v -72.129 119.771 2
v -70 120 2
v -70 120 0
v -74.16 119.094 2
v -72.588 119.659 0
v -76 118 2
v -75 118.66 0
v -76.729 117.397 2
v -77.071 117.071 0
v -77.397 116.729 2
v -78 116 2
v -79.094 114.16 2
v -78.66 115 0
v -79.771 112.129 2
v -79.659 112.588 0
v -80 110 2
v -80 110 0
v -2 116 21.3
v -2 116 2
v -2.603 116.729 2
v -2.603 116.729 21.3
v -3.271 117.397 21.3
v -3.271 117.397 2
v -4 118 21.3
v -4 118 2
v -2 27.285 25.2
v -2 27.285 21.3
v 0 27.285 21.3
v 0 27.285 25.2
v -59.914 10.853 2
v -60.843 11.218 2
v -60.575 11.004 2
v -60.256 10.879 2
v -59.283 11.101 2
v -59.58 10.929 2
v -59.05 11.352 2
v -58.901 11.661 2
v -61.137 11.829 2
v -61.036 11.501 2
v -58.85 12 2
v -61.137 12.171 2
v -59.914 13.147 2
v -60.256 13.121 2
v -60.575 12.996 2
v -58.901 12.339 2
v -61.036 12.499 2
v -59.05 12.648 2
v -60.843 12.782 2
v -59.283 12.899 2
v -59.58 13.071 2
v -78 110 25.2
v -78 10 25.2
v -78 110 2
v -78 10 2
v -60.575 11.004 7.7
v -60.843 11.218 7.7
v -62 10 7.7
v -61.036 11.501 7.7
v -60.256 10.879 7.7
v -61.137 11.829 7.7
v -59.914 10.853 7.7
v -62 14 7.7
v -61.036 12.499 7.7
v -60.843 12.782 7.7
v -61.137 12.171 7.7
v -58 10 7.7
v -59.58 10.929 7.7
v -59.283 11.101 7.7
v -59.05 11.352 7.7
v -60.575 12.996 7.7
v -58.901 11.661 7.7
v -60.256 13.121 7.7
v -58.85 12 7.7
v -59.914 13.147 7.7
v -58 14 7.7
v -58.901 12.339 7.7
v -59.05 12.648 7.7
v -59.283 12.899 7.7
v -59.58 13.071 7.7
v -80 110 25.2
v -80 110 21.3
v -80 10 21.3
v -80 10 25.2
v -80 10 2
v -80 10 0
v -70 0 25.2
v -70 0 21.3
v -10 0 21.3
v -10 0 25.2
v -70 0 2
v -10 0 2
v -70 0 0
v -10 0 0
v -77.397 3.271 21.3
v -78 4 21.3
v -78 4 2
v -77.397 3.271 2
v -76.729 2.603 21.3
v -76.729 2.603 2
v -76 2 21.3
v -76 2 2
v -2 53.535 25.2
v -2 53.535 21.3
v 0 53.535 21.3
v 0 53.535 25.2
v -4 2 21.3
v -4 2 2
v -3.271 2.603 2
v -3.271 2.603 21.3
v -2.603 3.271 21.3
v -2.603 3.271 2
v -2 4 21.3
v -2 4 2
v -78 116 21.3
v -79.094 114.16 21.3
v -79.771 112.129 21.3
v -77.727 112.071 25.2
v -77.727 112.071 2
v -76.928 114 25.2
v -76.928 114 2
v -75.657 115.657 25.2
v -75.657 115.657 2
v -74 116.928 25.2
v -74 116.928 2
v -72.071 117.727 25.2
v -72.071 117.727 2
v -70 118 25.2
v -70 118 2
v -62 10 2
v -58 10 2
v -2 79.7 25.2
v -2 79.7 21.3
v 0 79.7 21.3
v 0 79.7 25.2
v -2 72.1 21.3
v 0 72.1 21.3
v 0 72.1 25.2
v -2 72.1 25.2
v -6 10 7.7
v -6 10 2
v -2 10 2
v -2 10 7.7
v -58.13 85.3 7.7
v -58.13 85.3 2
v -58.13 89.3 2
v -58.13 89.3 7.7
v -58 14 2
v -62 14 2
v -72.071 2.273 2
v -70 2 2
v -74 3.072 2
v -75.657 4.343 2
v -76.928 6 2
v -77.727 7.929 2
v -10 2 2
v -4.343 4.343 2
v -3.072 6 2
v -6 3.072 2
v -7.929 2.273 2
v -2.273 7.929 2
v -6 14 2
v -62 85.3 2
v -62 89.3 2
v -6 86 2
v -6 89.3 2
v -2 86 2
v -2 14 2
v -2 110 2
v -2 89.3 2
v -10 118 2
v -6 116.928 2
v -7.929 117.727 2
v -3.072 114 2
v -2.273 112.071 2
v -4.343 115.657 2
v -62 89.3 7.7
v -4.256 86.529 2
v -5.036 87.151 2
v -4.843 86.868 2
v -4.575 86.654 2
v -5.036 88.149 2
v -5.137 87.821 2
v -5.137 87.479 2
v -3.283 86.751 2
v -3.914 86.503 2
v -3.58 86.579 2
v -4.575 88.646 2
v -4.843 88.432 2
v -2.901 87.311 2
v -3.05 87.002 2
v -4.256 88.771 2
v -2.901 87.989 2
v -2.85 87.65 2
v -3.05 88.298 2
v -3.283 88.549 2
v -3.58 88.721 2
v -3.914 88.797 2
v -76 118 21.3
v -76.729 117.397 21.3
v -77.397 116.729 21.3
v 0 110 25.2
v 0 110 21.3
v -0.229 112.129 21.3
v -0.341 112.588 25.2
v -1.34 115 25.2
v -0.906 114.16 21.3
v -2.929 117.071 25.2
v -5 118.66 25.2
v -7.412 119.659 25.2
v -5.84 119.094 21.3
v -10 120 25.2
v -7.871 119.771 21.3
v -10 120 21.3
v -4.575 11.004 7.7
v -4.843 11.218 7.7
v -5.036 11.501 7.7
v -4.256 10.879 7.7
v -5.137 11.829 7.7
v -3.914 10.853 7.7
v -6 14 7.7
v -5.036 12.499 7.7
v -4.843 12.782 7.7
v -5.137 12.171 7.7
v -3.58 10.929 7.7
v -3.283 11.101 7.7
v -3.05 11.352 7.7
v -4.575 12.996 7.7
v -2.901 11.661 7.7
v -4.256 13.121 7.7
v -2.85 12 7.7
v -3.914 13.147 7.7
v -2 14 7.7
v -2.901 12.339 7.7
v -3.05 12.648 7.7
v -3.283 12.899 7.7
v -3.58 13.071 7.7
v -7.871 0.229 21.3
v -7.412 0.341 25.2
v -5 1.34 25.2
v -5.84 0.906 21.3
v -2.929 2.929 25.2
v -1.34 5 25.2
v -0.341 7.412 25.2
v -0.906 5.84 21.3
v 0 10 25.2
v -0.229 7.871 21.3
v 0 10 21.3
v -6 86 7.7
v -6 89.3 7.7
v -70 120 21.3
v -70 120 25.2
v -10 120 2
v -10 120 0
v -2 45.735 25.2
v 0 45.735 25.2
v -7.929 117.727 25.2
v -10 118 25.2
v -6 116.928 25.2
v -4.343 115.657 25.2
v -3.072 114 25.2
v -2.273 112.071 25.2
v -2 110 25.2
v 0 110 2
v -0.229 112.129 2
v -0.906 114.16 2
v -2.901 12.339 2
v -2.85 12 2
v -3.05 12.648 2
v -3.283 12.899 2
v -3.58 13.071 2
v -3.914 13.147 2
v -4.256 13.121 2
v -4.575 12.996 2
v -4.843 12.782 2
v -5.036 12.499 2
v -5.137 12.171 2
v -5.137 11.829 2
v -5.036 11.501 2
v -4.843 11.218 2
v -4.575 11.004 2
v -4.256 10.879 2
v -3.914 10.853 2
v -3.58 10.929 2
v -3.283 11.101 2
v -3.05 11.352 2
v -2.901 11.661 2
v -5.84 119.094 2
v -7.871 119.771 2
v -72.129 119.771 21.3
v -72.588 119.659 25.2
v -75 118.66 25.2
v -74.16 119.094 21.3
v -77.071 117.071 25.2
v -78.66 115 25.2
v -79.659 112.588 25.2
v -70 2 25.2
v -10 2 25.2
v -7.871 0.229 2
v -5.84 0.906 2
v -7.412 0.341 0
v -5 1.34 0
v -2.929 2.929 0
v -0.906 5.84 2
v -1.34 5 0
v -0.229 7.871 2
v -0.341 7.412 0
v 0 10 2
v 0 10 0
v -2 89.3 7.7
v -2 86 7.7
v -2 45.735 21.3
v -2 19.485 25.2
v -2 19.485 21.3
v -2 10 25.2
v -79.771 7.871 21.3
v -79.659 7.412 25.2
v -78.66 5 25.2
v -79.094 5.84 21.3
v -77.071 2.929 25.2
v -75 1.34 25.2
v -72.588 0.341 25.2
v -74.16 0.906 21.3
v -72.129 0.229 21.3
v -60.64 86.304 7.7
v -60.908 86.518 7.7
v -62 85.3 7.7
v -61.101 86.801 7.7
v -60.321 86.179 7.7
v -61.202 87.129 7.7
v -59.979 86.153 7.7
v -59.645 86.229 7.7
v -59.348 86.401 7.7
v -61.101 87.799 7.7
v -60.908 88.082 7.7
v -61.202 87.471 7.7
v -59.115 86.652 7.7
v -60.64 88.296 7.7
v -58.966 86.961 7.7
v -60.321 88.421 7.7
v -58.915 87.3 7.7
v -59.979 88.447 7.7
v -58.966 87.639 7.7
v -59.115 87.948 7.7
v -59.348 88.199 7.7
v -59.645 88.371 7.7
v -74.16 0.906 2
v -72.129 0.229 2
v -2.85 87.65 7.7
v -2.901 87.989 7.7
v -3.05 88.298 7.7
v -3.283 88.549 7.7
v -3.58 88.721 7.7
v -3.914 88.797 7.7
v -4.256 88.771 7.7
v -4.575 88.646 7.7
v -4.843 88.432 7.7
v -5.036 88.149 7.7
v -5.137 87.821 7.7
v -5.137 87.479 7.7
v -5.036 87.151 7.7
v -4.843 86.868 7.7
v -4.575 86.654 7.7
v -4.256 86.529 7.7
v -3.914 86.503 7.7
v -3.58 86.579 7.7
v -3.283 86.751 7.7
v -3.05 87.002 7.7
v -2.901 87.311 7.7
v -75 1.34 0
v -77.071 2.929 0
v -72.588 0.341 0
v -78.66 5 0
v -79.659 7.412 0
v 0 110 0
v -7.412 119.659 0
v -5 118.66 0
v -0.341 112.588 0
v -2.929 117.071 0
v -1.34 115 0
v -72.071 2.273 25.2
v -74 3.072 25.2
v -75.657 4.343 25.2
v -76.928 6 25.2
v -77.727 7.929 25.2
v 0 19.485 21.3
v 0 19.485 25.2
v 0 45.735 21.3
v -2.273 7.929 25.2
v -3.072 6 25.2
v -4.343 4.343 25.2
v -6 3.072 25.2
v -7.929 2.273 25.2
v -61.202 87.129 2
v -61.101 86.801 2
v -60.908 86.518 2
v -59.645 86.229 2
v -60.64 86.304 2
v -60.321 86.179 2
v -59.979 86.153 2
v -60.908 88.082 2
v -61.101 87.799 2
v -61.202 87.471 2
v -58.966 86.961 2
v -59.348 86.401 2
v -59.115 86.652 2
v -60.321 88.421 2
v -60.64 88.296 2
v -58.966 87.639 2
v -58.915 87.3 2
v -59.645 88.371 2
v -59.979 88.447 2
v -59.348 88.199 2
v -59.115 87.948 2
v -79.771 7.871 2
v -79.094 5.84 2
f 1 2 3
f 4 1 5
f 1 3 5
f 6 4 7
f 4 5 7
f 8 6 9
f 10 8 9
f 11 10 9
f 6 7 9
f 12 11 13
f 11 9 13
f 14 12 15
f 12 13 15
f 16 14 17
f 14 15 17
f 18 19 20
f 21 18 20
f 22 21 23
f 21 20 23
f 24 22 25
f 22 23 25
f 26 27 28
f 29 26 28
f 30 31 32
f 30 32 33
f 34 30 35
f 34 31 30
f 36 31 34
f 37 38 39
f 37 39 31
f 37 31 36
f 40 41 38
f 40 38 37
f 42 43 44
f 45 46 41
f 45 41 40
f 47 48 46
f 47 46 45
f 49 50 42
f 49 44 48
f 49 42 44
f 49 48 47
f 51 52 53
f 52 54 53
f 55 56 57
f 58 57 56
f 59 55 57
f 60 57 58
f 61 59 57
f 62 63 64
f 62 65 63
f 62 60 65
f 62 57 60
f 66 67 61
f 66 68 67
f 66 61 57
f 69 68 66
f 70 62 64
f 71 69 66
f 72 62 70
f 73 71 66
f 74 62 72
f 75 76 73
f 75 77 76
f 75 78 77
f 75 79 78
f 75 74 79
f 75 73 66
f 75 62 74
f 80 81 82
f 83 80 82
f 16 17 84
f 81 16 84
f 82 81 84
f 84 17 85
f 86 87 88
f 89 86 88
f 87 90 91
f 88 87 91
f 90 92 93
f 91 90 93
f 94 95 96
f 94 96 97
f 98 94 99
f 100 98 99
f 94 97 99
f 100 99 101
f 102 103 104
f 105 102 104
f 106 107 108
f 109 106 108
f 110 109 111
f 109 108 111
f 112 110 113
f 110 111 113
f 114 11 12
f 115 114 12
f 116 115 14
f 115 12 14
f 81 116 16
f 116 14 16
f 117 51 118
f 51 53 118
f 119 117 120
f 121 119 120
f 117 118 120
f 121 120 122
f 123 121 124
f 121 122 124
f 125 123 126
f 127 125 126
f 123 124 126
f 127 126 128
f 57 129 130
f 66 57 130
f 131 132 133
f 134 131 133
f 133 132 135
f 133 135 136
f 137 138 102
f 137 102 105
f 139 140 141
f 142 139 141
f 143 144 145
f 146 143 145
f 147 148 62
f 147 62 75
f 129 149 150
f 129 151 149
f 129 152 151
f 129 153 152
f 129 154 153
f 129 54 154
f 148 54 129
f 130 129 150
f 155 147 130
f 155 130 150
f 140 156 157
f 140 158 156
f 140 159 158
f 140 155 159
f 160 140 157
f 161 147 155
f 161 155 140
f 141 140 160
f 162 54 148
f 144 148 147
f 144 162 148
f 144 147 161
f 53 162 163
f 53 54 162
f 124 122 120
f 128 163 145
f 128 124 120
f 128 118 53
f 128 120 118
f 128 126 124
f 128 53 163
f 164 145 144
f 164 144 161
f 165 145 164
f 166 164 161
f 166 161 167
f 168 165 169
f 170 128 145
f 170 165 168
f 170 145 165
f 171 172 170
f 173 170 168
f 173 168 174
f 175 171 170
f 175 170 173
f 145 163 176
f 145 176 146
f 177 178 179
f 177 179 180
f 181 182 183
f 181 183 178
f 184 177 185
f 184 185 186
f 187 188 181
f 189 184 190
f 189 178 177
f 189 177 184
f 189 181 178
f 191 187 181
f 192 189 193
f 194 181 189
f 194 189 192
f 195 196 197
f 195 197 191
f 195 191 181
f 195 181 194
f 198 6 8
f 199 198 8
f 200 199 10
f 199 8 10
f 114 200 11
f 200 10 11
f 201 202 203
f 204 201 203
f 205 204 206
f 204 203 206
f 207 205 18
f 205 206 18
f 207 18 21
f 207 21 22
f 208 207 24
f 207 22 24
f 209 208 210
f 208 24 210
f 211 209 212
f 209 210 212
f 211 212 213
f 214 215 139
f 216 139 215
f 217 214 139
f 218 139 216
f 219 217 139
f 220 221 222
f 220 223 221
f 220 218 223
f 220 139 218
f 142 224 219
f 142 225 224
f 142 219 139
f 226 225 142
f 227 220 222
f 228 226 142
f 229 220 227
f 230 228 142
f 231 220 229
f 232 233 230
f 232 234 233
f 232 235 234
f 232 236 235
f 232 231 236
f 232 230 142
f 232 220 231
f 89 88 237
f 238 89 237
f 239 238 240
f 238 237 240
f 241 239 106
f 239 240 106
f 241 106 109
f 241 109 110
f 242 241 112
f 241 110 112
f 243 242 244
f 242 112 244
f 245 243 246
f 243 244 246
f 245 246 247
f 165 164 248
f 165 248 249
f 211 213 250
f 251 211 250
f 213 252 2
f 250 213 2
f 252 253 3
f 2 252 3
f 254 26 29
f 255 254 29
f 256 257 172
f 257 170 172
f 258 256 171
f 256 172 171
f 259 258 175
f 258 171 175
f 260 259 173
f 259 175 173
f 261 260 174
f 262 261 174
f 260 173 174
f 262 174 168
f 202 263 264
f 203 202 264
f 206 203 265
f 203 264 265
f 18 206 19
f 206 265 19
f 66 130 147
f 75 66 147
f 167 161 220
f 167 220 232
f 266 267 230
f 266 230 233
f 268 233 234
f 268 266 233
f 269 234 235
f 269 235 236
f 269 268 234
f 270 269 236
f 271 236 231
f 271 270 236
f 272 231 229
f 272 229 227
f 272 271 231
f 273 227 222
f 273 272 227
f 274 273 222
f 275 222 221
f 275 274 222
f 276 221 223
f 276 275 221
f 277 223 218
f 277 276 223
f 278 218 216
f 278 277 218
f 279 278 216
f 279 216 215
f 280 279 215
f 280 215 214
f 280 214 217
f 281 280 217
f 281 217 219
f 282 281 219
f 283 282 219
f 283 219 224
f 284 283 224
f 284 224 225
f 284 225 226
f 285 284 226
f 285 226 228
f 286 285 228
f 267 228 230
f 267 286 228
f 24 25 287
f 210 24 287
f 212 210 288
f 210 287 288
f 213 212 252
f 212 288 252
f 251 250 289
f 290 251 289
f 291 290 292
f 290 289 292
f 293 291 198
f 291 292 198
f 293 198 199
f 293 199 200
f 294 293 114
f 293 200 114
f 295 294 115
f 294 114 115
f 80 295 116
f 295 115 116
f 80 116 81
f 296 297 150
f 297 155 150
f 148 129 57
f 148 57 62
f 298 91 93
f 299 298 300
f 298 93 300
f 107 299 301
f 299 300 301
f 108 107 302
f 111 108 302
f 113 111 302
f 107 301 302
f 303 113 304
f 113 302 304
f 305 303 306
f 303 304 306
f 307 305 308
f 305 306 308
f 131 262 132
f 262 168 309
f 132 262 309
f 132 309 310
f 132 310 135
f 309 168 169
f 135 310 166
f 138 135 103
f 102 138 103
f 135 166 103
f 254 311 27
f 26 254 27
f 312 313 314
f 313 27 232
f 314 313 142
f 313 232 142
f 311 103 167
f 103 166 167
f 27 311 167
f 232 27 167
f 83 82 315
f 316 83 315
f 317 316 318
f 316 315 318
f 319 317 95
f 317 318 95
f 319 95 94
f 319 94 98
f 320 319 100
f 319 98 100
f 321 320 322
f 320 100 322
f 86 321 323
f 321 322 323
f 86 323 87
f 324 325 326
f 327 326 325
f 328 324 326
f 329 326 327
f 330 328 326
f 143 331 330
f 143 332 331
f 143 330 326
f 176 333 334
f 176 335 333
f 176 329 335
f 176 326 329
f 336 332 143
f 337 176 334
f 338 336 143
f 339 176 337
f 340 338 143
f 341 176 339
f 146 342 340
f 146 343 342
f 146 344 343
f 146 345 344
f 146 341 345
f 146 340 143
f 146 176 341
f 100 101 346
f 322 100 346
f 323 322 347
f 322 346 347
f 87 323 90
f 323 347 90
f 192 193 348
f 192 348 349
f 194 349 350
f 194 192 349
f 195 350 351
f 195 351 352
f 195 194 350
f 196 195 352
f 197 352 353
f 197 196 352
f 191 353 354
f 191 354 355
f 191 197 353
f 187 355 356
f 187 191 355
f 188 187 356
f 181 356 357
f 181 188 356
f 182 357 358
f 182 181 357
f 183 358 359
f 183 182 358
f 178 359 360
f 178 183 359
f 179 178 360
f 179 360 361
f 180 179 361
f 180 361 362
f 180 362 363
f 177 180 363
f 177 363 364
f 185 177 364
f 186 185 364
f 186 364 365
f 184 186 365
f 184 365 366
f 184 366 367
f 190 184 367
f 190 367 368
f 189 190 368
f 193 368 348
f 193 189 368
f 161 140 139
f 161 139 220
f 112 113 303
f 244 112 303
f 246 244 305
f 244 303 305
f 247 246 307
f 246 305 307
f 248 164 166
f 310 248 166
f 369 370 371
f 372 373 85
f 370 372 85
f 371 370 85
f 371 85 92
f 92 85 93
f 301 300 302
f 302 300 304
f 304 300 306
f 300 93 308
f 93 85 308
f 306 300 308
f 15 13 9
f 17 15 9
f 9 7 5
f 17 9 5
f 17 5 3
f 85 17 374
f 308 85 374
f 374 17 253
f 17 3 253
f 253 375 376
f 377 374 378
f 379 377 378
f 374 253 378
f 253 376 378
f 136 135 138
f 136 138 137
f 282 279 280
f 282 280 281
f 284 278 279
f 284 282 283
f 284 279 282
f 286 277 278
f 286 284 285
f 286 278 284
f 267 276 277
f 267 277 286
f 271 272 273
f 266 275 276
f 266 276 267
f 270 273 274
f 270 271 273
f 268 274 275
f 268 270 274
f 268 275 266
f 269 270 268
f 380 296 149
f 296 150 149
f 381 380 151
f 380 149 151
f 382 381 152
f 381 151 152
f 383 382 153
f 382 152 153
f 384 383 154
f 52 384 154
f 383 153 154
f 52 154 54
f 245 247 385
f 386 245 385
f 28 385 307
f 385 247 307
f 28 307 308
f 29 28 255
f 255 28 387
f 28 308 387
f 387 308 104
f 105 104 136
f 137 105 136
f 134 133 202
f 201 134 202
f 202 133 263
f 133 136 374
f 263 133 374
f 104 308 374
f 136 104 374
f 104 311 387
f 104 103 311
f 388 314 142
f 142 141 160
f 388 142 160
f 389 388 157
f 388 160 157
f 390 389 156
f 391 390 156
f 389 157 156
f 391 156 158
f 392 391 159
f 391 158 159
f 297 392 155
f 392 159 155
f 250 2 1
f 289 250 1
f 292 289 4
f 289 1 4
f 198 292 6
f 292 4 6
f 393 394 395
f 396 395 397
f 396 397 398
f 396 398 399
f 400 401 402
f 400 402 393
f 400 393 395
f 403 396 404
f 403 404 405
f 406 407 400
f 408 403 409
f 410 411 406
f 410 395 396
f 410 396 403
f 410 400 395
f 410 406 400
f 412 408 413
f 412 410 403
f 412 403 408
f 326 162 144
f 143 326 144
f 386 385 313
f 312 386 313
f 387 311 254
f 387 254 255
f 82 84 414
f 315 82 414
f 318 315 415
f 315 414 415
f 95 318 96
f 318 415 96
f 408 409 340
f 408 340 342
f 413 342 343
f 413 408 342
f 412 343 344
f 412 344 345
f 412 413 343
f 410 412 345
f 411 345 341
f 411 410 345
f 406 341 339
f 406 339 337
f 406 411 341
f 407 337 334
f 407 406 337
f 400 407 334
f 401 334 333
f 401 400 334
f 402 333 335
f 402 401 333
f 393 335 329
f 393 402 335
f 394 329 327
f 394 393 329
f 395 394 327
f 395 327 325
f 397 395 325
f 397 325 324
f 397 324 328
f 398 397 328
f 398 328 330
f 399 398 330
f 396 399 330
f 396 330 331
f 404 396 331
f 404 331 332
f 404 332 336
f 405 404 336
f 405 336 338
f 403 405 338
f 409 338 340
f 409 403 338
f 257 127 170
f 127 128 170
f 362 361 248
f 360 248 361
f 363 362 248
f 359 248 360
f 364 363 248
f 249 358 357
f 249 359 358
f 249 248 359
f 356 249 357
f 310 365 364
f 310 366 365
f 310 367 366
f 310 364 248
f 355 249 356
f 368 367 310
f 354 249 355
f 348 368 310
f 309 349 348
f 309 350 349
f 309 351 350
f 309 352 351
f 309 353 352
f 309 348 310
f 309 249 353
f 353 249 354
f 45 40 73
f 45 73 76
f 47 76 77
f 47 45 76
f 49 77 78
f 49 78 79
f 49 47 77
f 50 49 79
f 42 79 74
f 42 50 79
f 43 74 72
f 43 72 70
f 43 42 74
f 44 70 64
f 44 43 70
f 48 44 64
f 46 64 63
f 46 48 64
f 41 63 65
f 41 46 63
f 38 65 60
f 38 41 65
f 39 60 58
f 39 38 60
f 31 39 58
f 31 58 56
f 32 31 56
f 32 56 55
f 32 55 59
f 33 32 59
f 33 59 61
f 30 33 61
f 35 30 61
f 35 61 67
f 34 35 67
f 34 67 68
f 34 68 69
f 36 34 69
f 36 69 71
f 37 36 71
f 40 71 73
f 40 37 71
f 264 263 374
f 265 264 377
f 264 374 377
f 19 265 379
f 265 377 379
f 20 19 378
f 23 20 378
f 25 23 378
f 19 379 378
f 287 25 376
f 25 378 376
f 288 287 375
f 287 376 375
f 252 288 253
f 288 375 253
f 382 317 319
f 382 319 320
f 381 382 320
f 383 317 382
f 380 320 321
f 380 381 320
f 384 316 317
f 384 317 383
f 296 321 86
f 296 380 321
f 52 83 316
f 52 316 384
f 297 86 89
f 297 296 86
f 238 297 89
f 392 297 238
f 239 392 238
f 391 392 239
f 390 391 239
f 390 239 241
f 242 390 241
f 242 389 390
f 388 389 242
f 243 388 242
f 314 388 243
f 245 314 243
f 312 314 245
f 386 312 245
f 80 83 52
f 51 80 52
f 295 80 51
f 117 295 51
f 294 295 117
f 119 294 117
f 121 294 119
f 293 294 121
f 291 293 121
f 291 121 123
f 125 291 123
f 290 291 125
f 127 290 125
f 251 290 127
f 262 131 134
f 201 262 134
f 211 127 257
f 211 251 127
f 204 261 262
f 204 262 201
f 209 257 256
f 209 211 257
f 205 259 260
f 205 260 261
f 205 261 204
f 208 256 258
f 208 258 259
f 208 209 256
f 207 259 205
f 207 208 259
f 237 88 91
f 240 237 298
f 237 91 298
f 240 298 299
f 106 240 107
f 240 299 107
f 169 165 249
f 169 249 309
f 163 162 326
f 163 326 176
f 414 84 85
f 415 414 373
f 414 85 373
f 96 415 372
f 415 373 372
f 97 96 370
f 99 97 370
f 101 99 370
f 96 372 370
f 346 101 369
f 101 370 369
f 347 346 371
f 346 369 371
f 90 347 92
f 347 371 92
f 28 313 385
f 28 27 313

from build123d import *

# Parameters (mm, degrees)
BOSS_EXTRU_3_DEPTH = 2
BOSS_EXTRU_4_DEPTH = 19.3
ESQUISSE4_W        = 2
ESQUISSE4_H        = 18.565
ESQUISSE4_H_2      = 18.45
BOSS_EXTRU_5_DEPTH = 3.9
ESQUISSE5_W        = 4
ESQUISSE5_H        = 4
ESQUISSE5_R        = 1.15
ESQUISSE5_W_2      = 3.87
ESQUISSE5_H_2      = 3.3
BOSS_EXTRU_6_DEPTH = 5.7


with BuildPart() as part:
    # Esquisse1 → Boss.-Extru.3 (new body)
    with BuildSketch(Plane.XY):
        with BuildLine():
            Line((-70, 0), (-10.000000065, 0))
            ThreePointArc((-10.000000065, 0), (-2.928932211, 2.928932165), (0, 10))
            Line((0, 10), (0, 110))
            ThreePointArc((0, 110), (-2.928932188, 117.071067812), (-10, 120))
            Line((-10, 120), (-70, 120))
            ThreePointArc((-70, 120), (-77.071067812, 117.071067812), (-80, 110))
            Line((-80, 110), (-80, 10))
            ThreePointArc((-80, 10), (-77.071067812, 2.928932188), (-70, 0))
        make_face()
    extrude(amount=BOSS_EXTRU_3_DEPTH)

    # Esquisse3 → Boss.-Extru.4 (add)
    with BuildSketch(Plane.XY.offset(2)):
        with BuildLine():
            ThreePointArc((-80, 10), (-79.486832981, 6.83772234), (-78, 4))
            Line((-78, 4), (-78, 10))
            Line((-78, 10), (-78, 16))
            ThreePointArc((-78, 16), (-79.486832981, 13.16227766), (-80, 10))
        make_face()
        with BuildLine():
            ThreePointArc((-78, 4), (-77.071067812, 2.928932188), (-76, 2))
            Line((-76, 2), (-70, 2))
            ThreePointArc((-70, 2), (-75.656854249, 4.343145751), (-78, 10))
            Line((-78, 10), (-78, 4))
        make_face()
        with BuildLine():
            ThreePointArc((-76, 2), (-73.16227766, 0.513167019), (-70, 0))
            ThreePointArc((-70, 0), (-66.83772234, 0.513167019), (-64, 2))
            Line((-64, 2), (-70, 2))
            Line((-70, 2), (-76, 2))
        make_face()
        with BuildLine():
            Line((-70, 0), (-10, 0))
            ThreePointArc((-10, 0), (-13.16227766, 0.513167019), (-16, 2))
            Line((-16, 2), (-64, 2))
            ThreePointArc((-64, 2), (-66.83772234, 0.513167019), (-70, 0))
        make_face()
        with BuildLine():
            ThreePointArc((-80, 10), (-79.486832981, 13.16227766), (-78, 16))
            Line((-78, 16), (-78, 104))
            ThreePointArc((-78, 104), (-79.486832981, 106.83772234), (-80, 110))
            Line((-80, 110), (-80, 10))
        make_face()
        with BuildLine():
            ThreePointArc((-80, 110), (-79.486832981, 106.83772234), (-78, 104))
            Line((-78, 104), (-78, 110))
            Line((-78, 110), (-78, 116))
            ThreePointArc((-78, 116), (-79.486832981, 113.16227766), (-80, 110))
        make_face()
        with BuildLine():
            ThreePointArc((-78, 110), (-75.656854249, 115.656854249), (-70, 118))
            Line((-70, 118), (-76, 118))
            ThreePointArc((-76, 118), (-77.071067812, 117.071067812), (-78, 116))
            Line((-78, 116), (-78, 110))
        make_face()
        with BuildLine():
            Line((-70, 118), (-64, 118))
            ThreePointArc((-64, 118), (-66.83772234, 119.486832981), (-70, 120))
            ThreePointArc((-70, 120), (-73.16227766, 119.486832981), (-76, 118))
            Line((-76, 118), (-70, 118))
        make_face()
        with BuildLine():
            Line((-64, 118), (-16, 118))
            ThreePointArc((-16, 118), (-13.16227766, 119.486832981), (-10, 120))
            Line((-10, 120), (-70, 120))
            ThreePointArc((-70, 120), (-66.83772234, 119.486832981), (-64, 118))
        make_face()
        with BuildLine():
            ThreePointArc((-10, 120), (-13.16227766, 119.486832981), (-16, 118))
            Line((-16, 118), (-10, 118))
            Line((-10, 118), (-4, 118))
            ThreePointArc((-4, 118), (-6.83772234, 119.486832981), (-10, 120))
        make_face()
        with BuildLine():
            Line((-2, 110), (-2, 116))
            ThreePointArc((-2, 116), (-2.928932188, 117.071067812), (-4, 118))
            Line((-4, 118), (-10, 118))
            ThreePointArc((-10, 118), (-4.343145751, 115.656854249), (-2, 110))
        make_face()
        with BuildLine():
            ThreePointArc((-2, 104), (-0.513167019, 106.83772234), (0, 110))
            ThreePointArc((0, 110), (-0.513167019, 113.16227766), (-2, 116))
            Line((-2, 116), (-2, 110))
            Line((-2, 110), (-2, 104))
        make_face()
        with BuildLine():
            ThreePointArc((-2, 16), (-0.513167019, 13.16227766), (0, 10))
            Line((0, 10), (0, 110))
            ThreePointArc((0, 110), (-0.513167019, 106.83772234), (-2, 104))
            Line((-2, 104), (-2, 16))
        make_face()
        with BuildLine():
            Line((-2, 10), (-2, 4))
            ThreePointArc((-2, 4), (-0.513167019, 6.83772234), (0, 10))
            ThreePointArc((0, 10), (-0.513167019, 13.16227766), (-2, 16))
            Line((-2, 16), (-2, 10))
        make_face()
        with BuildLine():
            Line((-10, 2), (-4, 2))
            ThreePointArc((-4, 2), (-2.928932188, 2.928932188), (-2, 4))
            Line((-2, 4), (-2, 10))
            ThreePointArc((-2, 10), (-4.343145751, 4.343145751), (-10, 2))
        make_face()
        with BuildLine():
            ThreePointArc((-10, 0), (-6.83772234, 0.513167019), (-4, 2))
            Line((-4, 2), (-10, 2))
            Line((-10, 2), (-16, 2))
            ThreePointArc((-16, 2), (-13.16227766, 0.513167019), (-10, 0))
        make_face()
    extrude(amount=BOSS_EXTRU_4_DEPTH)

    # Esquisse4 → Boss.-Extru.5 (add)
    with BuildSketch(Plane.XY.offset(21.3)):
        with BuildLine():
            Line((-64, 118), (-16, 118))
            ThreePointArc((-16, 118), (-13.16227766, 119.486832981), (-10, 120))
            Line((-10, 120), (-70, 120))
            ThreePointArc((-70, 120), (-66.83772234, 119.486832981), (-64, 118))
        make_face()
        with BuildLine():
            Line((-70, 118), (-64, 118))
            ThreePointArc((-64, 118), (-66.83772234, 119.486832981), (-70, 120))
            ThreePointArc((-70, 120), (-77.071067812, 117.071067812), (-80, 110))
            ThreePointArc((-80, 110), (-79.486832981, 106.83772234), (-78, 104))
            Line((-78, 104), (-78, 110))
            ThreePointArc((-78, 110), (-75.656854249, 115.656854249), (-70, 118))
        make_face()
        with BuildLine():
            Line((-2, 110), (-2, 104))
            ThreePointArc((-2, 104), (-0.513167019, 106.83772234), (0, 110))
            ThreePointArc((0, 110), (-2.928932188, 117.071067812), (-10, 120))
            ThreePointArc((-10, 120), (-13.16227766, 119.486832981), (-16, 118))
            Line((-16, 118), (-10, 118))
            ThreePointArc((-10, 118), (-4.343145751, 115.656854249), (-2, 110))
        make_face()
        with BuildLine():
            Line((-2, 104), (-2, 79.7))
            Line((-2, 79.7), (0, 79.7))
            Line((0, 79.7), (0, 110))
            ThreePointArc((0, 110), (-0.513167019, 106.83772234), (-2, 104))
        make_face()
        with Locations((-1, 62.8175)):
            Rectangle(ESQUISSE4_W, ESQUISSE4_H)
        with Locations((-1, 36.51)):
            Rectangle(ESQUISSE4_W, ESQUISSE4_H_2)
        with BuildLine():
            Line((0, 19.485), (-2, 19.485))
            Line((-2, 19.485), (-2, 16))
            ThreePointArc((-2, 16), (-0.513167019, 13.16227766), (0, 10))
            Line((0, 10), (0, 19.485))
        make_face()
        with BuildLine():
            ThreePointArc((0, 10), (-0.513167019, 13.16227766), (-2, 16))
            Line((-2, 16), (-2, 10))
            ThreePointArc((-2, 10), (-4.343145751, 4.343145751), (-10, 2))
            Line((-10, 2), (-16, 2))
            ThreePointArc((-16, 2), (-13.16227766, 0.513167019), (-10, 0))
            ThreePointArc((-10, 0), (-2.928932188, 2.928932188), (0, 10))
        make_face()
        with BuildLine():
            ThreePointArc((-64, 2), (-66.83772234, 0.513167019), (-70, 0))
            Line((-70, 0), (-10, 0))
            ThreePointArc((-10, 0), (-13.16227766, 0.513167019), (-16, 2))
            Line((-16, 2), (-64, 2))
        make_face()
        with BuildLine():
            ThreePointArc((-78, 16), (-79.486832981, 13.16227766), (-80, 10))
            ThreePointArc((-80, 10), (-77.071067812, 2.928932188), (-70, 0))
            ThreePointArc((-70, 0), (-66.83772234, 0.513167019), (-64, 2))
            Line((-64, 2), (-70, 2))
            ThreePointArc((-70, 2), (-75.656854249, 4.343145751), (-78, 10))
            Line((-78, 10), (-78, 16))
        make_face()
        with BuildLine():
            ThreePointArc((-78, 104), (-79.486832981, 106.83772234), (-80, 110))
            Line((-80, 110), (-80, 10))
            ThreePointArc((-80, 10), (-79.486832981, 13.16227766), (-78, 16))
            Line((-78, 16), (-78, 104))
        make_face()
    extrude(amount=BOSS_EXTRU_5_DEPTH)

    # Esquisse5 → Boss.-Extru.6 (add)
    # profile 1 of 4: a face of its own
    with BuildSketch(Plane.XY.offset(2)):
        with Locations((-4, 12)):
            Rectangle(ESQUISSE5_W, ESQUISSE5_H)
        with Locations((-4, 12)):
            Circle(ESQUISSE5_R, mode=Mode.SUBTRACT)
    # profile 2 of 4: a face of its own
    with BuildSketch(Plane.XY.offset(2)):
        with Locations((-60, 12)):
            Rectangle(ESQUISSE5_W, ESQUISSE5_H)
        with Locations((-60, 12)):
            Circle(ESQUISSE5_R, mode=Mode.SUBTRACT)
    # profile 3 of 4: a face of its own
    with BuildSketch(Plane.XY.offset(2)):
        with Locations((-60.065, 87.3)):
            Rectangle(ESQUISSE5_W_2, ESQUISSE5_H)
        with Locations((-60.065, 87.3)):
            Circle(ESQUISSE5_R, mode=Mode.SUBTRACT)
    # profile 4 of 4: a face of its own
    with BuildSketch(Plane.XY.offset(2)):
        with Locations((-4, 87.65)):
            Rectangle(ESQUISSE5_W, ESQUISSE5_H_2)
        with Locations((-4, 87.65)):
            Circle(ESQUISSE5_R, mode=Mode.SUBTRACT)
    extrude(amount=BOSS_EXTRU_6_DEPTH)


solid = part.part
